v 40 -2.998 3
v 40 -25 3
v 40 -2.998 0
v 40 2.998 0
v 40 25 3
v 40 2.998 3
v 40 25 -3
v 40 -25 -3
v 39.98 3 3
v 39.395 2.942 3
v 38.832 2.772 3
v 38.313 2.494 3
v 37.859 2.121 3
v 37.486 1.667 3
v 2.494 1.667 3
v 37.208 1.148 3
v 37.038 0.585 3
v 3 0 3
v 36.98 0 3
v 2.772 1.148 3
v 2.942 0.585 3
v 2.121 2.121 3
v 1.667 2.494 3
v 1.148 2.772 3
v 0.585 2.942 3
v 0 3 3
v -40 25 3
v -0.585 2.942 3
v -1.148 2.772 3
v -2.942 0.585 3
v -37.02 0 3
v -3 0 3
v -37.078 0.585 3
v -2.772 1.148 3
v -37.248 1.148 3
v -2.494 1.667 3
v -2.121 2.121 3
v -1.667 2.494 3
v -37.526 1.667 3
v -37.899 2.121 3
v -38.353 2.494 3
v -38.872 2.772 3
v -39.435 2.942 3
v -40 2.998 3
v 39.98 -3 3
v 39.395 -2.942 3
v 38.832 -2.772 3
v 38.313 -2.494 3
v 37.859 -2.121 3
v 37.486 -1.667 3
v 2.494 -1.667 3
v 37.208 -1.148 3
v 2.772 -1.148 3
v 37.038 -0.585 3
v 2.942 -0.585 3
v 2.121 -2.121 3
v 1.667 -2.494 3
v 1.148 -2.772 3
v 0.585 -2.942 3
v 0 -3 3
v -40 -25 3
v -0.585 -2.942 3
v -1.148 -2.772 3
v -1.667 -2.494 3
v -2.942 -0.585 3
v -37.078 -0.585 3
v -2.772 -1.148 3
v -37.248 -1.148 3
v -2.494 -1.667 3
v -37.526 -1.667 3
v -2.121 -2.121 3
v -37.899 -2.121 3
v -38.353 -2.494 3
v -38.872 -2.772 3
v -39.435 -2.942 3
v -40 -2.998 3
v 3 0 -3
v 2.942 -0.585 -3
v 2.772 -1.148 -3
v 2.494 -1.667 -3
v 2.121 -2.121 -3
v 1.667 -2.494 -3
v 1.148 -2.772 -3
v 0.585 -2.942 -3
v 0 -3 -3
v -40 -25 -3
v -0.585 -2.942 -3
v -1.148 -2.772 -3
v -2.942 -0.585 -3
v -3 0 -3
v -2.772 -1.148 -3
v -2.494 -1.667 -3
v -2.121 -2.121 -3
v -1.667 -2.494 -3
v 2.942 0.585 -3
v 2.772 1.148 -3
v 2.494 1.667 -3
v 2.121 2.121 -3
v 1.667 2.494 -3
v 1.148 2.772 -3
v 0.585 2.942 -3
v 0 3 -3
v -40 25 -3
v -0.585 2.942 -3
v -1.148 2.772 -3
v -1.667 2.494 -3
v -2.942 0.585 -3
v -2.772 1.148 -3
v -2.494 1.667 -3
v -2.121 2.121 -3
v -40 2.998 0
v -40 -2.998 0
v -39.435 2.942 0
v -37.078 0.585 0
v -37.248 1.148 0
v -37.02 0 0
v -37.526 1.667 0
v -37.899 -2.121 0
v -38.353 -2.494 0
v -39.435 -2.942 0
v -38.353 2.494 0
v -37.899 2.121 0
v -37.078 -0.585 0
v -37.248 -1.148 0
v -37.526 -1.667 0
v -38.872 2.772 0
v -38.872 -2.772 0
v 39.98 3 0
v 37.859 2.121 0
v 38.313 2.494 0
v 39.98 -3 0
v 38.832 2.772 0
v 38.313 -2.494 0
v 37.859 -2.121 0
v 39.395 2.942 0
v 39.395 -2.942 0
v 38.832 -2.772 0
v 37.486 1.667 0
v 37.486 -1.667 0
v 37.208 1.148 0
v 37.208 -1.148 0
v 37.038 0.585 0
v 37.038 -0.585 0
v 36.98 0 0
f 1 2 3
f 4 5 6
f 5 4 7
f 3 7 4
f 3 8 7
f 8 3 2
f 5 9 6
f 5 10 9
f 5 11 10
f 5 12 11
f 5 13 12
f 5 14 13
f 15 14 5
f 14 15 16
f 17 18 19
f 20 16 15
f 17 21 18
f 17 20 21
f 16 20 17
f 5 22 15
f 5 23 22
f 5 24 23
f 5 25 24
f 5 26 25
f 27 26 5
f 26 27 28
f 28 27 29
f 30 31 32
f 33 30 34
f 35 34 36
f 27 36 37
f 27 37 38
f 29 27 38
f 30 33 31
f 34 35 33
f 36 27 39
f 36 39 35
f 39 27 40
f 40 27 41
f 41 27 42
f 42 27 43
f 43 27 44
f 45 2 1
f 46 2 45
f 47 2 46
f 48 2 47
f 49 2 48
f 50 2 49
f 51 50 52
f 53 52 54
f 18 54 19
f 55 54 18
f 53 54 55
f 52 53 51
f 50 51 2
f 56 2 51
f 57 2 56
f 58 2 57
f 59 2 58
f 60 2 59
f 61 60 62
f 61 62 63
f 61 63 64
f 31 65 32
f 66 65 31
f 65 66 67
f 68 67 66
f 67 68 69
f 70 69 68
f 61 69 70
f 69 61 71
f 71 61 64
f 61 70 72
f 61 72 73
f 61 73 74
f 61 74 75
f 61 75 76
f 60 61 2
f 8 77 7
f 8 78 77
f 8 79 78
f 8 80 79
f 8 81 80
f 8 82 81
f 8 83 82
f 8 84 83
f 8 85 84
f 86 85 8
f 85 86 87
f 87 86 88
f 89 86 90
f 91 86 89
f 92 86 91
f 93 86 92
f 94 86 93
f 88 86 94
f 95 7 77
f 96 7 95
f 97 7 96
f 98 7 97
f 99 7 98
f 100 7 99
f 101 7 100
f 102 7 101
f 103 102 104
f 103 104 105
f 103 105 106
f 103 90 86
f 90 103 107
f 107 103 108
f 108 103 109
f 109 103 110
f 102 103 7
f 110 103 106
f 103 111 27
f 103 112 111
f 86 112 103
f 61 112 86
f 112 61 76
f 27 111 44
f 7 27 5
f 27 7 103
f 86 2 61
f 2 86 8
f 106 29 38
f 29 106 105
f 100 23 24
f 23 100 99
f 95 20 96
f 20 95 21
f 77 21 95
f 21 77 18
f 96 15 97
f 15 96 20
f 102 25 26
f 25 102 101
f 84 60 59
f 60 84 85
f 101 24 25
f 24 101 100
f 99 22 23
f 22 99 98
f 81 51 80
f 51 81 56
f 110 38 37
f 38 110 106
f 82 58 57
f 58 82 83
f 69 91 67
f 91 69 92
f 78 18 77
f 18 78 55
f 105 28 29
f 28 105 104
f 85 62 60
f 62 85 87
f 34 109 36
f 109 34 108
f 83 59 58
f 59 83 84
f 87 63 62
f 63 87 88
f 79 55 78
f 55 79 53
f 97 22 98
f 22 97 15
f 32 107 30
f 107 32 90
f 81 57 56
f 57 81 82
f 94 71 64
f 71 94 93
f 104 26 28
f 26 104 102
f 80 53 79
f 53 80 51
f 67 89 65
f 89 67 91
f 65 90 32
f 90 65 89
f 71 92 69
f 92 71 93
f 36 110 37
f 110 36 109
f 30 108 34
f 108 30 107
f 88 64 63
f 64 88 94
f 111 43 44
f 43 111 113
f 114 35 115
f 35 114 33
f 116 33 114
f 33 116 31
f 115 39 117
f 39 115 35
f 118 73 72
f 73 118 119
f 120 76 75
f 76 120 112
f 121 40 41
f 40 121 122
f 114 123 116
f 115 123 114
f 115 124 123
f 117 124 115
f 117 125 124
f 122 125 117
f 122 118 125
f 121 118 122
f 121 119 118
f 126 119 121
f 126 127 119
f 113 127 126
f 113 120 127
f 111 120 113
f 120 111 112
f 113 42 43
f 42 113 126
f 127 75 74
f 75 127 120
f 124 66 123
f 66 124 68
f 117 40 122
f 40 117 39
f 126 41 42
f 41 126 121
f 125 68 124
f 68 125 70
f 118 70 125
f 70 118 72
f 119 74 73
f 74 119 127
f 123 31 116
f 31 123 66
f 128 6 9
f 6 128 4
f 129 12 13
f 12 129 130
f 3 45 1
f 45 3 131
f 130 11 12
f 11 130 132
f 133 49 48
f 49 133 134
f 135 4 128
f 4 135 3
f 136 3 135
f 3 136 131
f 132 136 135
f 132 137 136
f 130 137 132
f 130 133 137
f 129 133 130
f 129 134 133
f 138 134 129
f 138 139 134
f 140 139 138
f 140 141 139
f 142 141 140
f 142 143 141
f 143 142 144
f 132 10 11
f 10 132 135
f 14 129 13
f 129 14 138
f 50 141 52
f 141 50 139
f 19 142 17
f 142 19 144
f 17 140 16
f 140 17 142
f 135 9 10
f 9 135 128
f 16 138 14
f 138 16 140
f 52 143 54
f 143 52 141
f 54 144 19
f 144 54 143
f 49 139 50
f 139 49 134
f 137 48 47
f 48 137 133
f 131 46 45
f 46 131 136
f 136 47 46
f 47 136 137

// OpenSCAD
$fn = 32;
// Крепёжная пластина 80x50x6 мм с 4 отверстиями по углам.
eps = 0.02;
plate_w = 80;
plate_l = 50;
plate_t = 6;
hole_d = 6;
hole_d = 6;
hole_d = 6;
hole_d = 6;
difference() {
    cube([plate_w, plate_l, plate_t], center = true);
    translate([0, 0, -plate_t / 2 - eps]) cylinder(d = 6, h = plate_t + 2 * eps);
    translate([0, 0, plate_t / 2 + eps]) cylinder(d = 6, h = plate_t + 2 * eps);
    translate([-plate_w / 2 - eps, 0, 0]) cylinder(d = 6, h = plate_w + 2 * eps);
    translate([plate_w / 2 - eps, 0, 0]) cylinder(d = 6, h = plate_w + 2 * eps);
}
